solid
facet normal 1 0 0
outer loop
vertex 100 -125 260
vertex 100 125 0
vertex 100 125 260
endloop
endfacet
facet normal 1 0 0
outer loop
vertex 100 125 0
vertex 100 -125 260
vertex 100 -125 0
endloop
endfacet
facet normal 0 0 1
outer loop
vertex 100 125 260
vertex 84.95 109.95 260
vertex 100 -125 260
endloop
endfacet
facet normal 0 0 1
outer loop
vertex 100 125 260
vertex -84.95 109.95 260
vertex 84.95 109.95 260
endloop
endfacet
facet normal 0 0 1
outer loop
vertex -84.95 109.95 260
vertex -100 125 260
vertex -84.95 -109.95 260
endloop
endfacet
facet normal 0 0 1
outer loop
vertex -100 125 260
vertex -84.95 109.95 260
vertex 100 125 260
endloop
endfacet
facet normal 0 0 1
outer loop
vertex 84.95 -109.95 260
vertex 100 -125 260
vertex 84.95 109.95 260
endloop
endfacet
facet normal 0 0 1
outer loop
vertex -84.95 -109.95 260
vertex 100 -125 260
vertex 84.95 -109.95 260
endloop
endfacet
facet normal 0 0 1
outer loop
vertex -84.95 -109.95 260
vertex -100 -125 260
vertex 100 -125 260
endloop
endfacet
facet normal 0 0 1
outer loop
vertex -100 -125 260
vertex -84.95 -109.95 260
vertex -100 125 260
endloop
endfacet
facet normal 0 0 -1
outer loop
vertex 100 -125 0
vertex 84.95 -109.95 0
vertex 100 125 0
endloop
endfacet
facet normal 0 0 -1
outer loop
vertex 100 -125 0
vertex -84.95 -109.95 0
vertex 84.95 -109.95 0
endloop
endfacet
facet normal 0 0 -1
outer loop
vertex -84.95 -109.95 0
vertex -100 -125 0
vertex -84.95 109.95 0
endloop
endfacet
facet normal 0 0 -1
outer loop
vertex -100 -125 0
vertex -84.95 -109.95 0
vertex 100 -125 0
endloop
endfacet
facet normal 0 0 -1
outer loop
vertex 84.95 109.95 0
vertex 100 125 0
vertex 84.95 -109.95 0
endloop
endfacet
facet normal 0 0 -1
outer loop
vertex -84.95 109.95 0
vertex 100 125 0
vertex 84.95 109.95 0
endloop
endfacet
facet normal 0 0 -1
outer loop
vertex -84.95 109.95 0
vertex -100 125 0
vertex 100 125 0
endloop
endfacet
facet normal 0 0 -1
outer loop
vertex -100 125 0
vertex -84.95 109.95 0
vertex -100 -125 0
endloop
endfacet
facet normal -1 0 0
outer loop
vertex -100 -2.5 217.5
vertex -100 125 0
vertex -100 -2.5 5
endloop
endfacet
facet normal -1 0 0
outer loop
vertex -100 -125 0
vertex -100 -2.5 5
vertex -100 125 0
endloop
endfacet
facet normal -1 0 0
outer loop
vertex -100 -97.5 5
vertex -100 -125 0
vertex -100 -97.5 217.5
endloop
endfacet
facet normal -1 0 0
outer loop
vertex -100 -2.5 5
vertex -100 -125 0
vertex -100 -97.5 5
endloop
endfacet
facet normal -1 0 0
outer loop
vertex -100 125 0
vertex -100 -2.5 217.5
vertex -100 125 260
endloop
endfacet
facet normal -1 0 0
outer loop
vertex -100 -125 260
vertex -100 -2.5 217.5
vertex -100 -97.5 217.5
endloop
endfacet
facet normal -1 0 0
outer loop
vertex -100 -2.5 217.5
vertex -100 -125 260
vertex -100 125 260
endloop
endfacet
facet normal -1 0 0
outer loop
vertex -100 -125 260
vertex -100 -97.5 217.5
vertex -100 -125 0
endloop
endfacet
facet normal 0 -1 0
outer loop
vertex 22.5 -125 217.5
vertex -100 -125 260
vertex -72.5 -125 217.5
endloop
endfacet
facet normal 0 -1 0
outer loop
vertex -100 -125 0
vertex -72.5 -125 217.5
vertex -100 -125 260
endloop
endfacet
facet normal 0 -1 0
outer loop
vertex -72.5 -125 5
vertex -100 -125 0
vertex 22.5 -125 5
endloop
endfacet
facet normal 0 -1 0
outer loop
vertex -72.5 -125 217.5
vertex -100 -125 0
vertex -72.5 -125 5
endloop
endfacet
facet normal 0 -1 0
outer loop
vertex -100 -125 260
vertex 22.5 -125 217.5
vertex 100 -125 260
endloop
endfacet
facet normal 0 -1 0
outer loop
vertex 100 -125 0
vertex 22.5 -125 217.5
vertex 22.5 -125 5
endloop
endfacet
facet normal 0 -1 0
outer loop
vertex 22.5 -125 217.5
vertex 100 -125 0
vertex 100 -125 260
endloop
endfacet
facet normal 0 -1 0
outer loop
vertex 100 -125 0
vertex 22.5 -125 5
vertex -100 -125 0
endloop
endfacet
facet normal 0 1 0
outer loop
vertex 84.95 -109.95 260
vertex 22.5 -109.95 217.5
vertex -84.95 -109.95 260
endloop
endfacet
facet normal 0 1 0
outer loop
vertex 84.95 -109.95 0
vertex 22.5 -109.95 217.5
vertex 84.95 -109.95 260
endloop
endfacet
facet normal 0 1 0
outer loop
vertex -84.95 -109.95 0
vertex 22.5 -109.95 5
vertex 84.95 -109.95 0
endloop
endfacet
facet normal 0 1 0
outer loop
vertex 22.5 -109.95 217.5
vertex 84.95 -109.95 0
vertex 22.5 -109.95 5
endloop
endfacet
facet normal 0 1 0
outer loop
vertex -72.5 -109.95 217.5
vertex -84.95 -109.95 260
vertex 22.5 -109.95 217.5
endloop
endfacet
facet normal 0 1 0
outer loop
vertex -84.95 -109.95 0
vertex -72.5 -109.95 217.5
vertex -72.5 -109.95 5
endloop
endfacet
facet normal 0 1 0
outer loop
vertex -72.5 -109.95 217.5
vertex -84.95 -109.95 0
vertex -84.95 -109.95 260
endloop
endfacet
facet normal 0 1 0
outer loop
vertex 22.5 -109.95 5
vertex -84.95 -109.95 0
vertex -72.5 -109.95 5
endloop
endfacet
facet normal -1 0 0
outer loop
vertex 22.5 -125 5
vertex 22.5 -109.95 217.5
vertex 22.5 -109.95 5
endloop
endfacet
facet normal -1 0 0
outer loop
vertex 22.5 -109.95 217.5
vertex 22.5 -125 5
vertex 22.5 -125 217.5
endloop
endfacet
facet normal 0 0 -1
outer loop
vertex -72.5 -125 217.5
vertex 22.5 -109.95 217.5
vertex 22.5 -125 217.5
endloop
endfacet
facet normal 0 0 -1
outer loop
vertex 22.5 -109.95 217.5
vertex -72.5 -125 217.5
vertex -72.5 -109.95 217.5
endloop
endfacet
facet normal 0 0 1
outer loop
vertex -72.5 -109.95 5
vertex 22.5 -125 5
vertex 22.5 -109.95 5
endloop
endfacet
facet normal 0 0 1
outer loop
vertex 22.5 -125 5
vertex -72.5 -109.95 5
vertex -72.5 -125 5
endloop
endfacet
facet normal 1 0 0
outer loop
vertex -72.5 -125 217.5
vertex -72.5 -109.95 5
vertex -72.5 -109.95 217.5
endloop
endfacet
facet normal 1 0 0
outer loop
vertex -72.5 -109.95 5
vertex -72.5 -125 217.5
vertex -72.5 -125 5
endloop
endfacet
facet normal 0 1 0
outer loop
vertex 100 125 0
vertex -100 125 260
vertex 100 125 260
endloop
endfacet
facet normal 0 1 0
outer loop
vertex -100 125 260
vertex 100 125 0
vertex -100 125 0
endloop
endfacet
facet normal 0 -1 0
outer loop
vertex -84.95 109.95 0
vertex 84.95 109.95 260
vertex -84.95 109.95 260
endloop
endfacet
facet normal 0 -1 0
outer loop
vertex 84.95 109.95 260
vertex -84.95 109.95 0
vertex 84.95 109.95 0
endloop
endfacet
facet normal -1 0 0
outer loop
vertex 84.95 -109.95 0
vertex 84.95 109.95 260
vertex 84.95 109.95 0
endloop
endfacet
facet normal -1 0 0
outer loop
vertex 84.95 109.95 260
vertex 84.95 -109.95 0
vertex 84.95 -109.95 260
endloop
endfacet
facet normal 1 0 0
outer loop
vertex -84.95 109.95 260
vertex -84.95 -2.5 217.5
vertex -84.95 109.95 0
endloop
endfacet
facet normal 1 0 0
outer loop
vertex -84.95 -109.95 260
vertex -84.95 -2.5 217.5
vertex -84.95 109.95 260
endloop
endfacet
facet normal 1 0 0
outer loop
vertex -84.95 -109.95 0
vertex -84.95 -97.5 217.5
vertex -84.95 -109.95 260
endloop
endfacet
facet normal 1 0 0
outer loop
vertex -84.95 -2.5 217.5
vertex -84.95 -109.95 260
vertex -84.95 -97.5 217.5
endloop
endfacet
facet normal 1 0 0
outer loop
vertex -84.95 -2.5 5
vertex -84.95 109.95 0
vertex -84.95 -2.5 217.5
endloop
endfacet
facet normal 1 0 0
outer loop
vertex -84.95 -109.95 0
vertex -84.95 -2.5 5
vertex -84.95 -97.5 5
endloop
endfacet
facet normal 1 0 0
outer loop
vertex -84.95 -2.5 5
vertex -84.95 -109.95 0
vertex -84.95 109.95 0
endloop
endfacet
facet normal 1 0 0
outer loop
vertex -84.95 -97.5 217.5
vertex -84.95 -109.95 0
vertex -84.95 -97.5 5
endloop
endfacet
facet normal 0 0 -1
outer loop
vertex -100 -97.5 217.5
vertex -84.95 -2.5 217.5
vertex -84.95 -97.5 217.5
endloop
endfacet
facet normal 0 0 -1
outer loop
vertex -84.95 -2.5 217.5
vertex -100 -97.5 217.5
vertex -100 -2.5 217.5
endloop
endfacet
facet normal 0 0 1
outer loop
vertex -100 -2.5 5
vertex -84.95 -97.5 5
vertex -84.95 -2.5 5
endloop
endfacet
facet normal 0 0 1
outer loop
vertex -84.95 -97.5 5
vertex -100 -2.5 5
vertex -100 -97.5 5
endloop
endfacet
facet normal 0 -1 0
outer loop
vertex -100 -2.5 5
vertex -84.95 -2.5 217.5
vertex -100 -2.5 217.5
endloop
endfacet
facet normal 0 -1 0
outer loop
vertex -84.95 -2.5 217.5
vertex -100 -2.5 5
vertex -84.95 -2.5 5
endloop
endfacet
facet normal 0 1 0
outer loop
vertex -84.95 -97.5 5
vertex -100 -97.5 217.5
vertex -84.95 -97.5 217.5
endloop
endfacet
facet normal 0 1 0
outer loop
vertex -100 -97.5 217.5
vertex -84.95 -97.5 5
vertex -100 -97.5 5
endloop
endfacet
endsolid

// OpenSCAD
module bedroomwalls(width=250, length=200, wall_thickness=15, wall_height=260,wall_color=[255/255, 255/255, 255/255],wall_alpha=1.0, paint_the_room = [0.0, 0.3,0.9])
{
    // Door opening size. Then we need some extra space for the door frame.
    door_width = 90+5;
    door_height = 210+2.5;
    
    // Position the door so that bottom of opening is 5 cm above floor level
    door_y_pos = (wall_height-door_height)/2 - 5;
        
    // Position the door horizontally off the center.
    door_x_pos = -width/5;
    side_door_x_pos = -width/10;
    
    // Rise the part of floor which should stay dry by 2.5 cm.
    rise_floor = 2.5;
    rised_width = width/2;
    
    // Rise walk in floor more to allow sitting to toilet seat with dry feet by 2.0 cm for 100 cm
    double_rise_floor = 2.0;
    double_rised_length = 100;
    
    // Hole size, 8 cm
    hole_size = 8;

    difference() {
        union() {
            translate([0,-width/2+wall_thickness/2, wall_height/2]) 
            color(wall_color,wall_alpha) 
            cube([length, wall_thickness, wall_height],center=true);
            
            translate([0,-width/2+wall_thickness, wall_height/2]) 
            color(paint_the_room,wall_alpha) 
            cube([length, 0.1, wall_height],center=true);
        }
    
        // Door 
            translate([side_door_x_pos,-width/2+wall_thickness/2, wall_height/2-door_y_pos]) cube([door_width, wall_thickness+1, door_height],center=true);
    }

    difference() {
        union() {
            translate([0,width/2-wall_thickness/2, wall_height/2]) color(wall_color,wall_alpha) cube([length,  wall_thickness, wall_height],center=true);
            translate([0,width/2-wall_thickness, wall_height/2]) color(paint_the_room,wall_alpha) cube([length,  0.1, wall_height],center=true);
        }
    }
    
    difference() {
        union() {
            translate([length/2-wall_thickness/2, 0, wall_height/2]) color(wall_color,wall_alpha) cube([wall_thickness, width, wall_height],center=true);
            translate([length/2-wall_thickness, 0, wall_height/2]) color(paint_the_room,wall_alpha) cube([0.1, width, wall_height],center=true);
        }
    }     

    difference() {
        union() {
            translate([-length/2+wall_thickness/2, 0, wall_height/2]) color(wall_color,wall_alpha) cube([wall_thickness, width, wall_height],center=true);
            translate([-length/2+wall_thickness, 0, wall_height/2])  color(paint_the_room,wall_alpha) cube([0.1, width, wall_height],center=true);
        }

        // Door
        translate([-length/2+wall_thickness/2, door_x_pos, wall_height/2-door_y_pos])
               cube([wall_thickness+1, door_width, door_height],center=true);
    }
}

/* For testing */
bedroomwalls();
